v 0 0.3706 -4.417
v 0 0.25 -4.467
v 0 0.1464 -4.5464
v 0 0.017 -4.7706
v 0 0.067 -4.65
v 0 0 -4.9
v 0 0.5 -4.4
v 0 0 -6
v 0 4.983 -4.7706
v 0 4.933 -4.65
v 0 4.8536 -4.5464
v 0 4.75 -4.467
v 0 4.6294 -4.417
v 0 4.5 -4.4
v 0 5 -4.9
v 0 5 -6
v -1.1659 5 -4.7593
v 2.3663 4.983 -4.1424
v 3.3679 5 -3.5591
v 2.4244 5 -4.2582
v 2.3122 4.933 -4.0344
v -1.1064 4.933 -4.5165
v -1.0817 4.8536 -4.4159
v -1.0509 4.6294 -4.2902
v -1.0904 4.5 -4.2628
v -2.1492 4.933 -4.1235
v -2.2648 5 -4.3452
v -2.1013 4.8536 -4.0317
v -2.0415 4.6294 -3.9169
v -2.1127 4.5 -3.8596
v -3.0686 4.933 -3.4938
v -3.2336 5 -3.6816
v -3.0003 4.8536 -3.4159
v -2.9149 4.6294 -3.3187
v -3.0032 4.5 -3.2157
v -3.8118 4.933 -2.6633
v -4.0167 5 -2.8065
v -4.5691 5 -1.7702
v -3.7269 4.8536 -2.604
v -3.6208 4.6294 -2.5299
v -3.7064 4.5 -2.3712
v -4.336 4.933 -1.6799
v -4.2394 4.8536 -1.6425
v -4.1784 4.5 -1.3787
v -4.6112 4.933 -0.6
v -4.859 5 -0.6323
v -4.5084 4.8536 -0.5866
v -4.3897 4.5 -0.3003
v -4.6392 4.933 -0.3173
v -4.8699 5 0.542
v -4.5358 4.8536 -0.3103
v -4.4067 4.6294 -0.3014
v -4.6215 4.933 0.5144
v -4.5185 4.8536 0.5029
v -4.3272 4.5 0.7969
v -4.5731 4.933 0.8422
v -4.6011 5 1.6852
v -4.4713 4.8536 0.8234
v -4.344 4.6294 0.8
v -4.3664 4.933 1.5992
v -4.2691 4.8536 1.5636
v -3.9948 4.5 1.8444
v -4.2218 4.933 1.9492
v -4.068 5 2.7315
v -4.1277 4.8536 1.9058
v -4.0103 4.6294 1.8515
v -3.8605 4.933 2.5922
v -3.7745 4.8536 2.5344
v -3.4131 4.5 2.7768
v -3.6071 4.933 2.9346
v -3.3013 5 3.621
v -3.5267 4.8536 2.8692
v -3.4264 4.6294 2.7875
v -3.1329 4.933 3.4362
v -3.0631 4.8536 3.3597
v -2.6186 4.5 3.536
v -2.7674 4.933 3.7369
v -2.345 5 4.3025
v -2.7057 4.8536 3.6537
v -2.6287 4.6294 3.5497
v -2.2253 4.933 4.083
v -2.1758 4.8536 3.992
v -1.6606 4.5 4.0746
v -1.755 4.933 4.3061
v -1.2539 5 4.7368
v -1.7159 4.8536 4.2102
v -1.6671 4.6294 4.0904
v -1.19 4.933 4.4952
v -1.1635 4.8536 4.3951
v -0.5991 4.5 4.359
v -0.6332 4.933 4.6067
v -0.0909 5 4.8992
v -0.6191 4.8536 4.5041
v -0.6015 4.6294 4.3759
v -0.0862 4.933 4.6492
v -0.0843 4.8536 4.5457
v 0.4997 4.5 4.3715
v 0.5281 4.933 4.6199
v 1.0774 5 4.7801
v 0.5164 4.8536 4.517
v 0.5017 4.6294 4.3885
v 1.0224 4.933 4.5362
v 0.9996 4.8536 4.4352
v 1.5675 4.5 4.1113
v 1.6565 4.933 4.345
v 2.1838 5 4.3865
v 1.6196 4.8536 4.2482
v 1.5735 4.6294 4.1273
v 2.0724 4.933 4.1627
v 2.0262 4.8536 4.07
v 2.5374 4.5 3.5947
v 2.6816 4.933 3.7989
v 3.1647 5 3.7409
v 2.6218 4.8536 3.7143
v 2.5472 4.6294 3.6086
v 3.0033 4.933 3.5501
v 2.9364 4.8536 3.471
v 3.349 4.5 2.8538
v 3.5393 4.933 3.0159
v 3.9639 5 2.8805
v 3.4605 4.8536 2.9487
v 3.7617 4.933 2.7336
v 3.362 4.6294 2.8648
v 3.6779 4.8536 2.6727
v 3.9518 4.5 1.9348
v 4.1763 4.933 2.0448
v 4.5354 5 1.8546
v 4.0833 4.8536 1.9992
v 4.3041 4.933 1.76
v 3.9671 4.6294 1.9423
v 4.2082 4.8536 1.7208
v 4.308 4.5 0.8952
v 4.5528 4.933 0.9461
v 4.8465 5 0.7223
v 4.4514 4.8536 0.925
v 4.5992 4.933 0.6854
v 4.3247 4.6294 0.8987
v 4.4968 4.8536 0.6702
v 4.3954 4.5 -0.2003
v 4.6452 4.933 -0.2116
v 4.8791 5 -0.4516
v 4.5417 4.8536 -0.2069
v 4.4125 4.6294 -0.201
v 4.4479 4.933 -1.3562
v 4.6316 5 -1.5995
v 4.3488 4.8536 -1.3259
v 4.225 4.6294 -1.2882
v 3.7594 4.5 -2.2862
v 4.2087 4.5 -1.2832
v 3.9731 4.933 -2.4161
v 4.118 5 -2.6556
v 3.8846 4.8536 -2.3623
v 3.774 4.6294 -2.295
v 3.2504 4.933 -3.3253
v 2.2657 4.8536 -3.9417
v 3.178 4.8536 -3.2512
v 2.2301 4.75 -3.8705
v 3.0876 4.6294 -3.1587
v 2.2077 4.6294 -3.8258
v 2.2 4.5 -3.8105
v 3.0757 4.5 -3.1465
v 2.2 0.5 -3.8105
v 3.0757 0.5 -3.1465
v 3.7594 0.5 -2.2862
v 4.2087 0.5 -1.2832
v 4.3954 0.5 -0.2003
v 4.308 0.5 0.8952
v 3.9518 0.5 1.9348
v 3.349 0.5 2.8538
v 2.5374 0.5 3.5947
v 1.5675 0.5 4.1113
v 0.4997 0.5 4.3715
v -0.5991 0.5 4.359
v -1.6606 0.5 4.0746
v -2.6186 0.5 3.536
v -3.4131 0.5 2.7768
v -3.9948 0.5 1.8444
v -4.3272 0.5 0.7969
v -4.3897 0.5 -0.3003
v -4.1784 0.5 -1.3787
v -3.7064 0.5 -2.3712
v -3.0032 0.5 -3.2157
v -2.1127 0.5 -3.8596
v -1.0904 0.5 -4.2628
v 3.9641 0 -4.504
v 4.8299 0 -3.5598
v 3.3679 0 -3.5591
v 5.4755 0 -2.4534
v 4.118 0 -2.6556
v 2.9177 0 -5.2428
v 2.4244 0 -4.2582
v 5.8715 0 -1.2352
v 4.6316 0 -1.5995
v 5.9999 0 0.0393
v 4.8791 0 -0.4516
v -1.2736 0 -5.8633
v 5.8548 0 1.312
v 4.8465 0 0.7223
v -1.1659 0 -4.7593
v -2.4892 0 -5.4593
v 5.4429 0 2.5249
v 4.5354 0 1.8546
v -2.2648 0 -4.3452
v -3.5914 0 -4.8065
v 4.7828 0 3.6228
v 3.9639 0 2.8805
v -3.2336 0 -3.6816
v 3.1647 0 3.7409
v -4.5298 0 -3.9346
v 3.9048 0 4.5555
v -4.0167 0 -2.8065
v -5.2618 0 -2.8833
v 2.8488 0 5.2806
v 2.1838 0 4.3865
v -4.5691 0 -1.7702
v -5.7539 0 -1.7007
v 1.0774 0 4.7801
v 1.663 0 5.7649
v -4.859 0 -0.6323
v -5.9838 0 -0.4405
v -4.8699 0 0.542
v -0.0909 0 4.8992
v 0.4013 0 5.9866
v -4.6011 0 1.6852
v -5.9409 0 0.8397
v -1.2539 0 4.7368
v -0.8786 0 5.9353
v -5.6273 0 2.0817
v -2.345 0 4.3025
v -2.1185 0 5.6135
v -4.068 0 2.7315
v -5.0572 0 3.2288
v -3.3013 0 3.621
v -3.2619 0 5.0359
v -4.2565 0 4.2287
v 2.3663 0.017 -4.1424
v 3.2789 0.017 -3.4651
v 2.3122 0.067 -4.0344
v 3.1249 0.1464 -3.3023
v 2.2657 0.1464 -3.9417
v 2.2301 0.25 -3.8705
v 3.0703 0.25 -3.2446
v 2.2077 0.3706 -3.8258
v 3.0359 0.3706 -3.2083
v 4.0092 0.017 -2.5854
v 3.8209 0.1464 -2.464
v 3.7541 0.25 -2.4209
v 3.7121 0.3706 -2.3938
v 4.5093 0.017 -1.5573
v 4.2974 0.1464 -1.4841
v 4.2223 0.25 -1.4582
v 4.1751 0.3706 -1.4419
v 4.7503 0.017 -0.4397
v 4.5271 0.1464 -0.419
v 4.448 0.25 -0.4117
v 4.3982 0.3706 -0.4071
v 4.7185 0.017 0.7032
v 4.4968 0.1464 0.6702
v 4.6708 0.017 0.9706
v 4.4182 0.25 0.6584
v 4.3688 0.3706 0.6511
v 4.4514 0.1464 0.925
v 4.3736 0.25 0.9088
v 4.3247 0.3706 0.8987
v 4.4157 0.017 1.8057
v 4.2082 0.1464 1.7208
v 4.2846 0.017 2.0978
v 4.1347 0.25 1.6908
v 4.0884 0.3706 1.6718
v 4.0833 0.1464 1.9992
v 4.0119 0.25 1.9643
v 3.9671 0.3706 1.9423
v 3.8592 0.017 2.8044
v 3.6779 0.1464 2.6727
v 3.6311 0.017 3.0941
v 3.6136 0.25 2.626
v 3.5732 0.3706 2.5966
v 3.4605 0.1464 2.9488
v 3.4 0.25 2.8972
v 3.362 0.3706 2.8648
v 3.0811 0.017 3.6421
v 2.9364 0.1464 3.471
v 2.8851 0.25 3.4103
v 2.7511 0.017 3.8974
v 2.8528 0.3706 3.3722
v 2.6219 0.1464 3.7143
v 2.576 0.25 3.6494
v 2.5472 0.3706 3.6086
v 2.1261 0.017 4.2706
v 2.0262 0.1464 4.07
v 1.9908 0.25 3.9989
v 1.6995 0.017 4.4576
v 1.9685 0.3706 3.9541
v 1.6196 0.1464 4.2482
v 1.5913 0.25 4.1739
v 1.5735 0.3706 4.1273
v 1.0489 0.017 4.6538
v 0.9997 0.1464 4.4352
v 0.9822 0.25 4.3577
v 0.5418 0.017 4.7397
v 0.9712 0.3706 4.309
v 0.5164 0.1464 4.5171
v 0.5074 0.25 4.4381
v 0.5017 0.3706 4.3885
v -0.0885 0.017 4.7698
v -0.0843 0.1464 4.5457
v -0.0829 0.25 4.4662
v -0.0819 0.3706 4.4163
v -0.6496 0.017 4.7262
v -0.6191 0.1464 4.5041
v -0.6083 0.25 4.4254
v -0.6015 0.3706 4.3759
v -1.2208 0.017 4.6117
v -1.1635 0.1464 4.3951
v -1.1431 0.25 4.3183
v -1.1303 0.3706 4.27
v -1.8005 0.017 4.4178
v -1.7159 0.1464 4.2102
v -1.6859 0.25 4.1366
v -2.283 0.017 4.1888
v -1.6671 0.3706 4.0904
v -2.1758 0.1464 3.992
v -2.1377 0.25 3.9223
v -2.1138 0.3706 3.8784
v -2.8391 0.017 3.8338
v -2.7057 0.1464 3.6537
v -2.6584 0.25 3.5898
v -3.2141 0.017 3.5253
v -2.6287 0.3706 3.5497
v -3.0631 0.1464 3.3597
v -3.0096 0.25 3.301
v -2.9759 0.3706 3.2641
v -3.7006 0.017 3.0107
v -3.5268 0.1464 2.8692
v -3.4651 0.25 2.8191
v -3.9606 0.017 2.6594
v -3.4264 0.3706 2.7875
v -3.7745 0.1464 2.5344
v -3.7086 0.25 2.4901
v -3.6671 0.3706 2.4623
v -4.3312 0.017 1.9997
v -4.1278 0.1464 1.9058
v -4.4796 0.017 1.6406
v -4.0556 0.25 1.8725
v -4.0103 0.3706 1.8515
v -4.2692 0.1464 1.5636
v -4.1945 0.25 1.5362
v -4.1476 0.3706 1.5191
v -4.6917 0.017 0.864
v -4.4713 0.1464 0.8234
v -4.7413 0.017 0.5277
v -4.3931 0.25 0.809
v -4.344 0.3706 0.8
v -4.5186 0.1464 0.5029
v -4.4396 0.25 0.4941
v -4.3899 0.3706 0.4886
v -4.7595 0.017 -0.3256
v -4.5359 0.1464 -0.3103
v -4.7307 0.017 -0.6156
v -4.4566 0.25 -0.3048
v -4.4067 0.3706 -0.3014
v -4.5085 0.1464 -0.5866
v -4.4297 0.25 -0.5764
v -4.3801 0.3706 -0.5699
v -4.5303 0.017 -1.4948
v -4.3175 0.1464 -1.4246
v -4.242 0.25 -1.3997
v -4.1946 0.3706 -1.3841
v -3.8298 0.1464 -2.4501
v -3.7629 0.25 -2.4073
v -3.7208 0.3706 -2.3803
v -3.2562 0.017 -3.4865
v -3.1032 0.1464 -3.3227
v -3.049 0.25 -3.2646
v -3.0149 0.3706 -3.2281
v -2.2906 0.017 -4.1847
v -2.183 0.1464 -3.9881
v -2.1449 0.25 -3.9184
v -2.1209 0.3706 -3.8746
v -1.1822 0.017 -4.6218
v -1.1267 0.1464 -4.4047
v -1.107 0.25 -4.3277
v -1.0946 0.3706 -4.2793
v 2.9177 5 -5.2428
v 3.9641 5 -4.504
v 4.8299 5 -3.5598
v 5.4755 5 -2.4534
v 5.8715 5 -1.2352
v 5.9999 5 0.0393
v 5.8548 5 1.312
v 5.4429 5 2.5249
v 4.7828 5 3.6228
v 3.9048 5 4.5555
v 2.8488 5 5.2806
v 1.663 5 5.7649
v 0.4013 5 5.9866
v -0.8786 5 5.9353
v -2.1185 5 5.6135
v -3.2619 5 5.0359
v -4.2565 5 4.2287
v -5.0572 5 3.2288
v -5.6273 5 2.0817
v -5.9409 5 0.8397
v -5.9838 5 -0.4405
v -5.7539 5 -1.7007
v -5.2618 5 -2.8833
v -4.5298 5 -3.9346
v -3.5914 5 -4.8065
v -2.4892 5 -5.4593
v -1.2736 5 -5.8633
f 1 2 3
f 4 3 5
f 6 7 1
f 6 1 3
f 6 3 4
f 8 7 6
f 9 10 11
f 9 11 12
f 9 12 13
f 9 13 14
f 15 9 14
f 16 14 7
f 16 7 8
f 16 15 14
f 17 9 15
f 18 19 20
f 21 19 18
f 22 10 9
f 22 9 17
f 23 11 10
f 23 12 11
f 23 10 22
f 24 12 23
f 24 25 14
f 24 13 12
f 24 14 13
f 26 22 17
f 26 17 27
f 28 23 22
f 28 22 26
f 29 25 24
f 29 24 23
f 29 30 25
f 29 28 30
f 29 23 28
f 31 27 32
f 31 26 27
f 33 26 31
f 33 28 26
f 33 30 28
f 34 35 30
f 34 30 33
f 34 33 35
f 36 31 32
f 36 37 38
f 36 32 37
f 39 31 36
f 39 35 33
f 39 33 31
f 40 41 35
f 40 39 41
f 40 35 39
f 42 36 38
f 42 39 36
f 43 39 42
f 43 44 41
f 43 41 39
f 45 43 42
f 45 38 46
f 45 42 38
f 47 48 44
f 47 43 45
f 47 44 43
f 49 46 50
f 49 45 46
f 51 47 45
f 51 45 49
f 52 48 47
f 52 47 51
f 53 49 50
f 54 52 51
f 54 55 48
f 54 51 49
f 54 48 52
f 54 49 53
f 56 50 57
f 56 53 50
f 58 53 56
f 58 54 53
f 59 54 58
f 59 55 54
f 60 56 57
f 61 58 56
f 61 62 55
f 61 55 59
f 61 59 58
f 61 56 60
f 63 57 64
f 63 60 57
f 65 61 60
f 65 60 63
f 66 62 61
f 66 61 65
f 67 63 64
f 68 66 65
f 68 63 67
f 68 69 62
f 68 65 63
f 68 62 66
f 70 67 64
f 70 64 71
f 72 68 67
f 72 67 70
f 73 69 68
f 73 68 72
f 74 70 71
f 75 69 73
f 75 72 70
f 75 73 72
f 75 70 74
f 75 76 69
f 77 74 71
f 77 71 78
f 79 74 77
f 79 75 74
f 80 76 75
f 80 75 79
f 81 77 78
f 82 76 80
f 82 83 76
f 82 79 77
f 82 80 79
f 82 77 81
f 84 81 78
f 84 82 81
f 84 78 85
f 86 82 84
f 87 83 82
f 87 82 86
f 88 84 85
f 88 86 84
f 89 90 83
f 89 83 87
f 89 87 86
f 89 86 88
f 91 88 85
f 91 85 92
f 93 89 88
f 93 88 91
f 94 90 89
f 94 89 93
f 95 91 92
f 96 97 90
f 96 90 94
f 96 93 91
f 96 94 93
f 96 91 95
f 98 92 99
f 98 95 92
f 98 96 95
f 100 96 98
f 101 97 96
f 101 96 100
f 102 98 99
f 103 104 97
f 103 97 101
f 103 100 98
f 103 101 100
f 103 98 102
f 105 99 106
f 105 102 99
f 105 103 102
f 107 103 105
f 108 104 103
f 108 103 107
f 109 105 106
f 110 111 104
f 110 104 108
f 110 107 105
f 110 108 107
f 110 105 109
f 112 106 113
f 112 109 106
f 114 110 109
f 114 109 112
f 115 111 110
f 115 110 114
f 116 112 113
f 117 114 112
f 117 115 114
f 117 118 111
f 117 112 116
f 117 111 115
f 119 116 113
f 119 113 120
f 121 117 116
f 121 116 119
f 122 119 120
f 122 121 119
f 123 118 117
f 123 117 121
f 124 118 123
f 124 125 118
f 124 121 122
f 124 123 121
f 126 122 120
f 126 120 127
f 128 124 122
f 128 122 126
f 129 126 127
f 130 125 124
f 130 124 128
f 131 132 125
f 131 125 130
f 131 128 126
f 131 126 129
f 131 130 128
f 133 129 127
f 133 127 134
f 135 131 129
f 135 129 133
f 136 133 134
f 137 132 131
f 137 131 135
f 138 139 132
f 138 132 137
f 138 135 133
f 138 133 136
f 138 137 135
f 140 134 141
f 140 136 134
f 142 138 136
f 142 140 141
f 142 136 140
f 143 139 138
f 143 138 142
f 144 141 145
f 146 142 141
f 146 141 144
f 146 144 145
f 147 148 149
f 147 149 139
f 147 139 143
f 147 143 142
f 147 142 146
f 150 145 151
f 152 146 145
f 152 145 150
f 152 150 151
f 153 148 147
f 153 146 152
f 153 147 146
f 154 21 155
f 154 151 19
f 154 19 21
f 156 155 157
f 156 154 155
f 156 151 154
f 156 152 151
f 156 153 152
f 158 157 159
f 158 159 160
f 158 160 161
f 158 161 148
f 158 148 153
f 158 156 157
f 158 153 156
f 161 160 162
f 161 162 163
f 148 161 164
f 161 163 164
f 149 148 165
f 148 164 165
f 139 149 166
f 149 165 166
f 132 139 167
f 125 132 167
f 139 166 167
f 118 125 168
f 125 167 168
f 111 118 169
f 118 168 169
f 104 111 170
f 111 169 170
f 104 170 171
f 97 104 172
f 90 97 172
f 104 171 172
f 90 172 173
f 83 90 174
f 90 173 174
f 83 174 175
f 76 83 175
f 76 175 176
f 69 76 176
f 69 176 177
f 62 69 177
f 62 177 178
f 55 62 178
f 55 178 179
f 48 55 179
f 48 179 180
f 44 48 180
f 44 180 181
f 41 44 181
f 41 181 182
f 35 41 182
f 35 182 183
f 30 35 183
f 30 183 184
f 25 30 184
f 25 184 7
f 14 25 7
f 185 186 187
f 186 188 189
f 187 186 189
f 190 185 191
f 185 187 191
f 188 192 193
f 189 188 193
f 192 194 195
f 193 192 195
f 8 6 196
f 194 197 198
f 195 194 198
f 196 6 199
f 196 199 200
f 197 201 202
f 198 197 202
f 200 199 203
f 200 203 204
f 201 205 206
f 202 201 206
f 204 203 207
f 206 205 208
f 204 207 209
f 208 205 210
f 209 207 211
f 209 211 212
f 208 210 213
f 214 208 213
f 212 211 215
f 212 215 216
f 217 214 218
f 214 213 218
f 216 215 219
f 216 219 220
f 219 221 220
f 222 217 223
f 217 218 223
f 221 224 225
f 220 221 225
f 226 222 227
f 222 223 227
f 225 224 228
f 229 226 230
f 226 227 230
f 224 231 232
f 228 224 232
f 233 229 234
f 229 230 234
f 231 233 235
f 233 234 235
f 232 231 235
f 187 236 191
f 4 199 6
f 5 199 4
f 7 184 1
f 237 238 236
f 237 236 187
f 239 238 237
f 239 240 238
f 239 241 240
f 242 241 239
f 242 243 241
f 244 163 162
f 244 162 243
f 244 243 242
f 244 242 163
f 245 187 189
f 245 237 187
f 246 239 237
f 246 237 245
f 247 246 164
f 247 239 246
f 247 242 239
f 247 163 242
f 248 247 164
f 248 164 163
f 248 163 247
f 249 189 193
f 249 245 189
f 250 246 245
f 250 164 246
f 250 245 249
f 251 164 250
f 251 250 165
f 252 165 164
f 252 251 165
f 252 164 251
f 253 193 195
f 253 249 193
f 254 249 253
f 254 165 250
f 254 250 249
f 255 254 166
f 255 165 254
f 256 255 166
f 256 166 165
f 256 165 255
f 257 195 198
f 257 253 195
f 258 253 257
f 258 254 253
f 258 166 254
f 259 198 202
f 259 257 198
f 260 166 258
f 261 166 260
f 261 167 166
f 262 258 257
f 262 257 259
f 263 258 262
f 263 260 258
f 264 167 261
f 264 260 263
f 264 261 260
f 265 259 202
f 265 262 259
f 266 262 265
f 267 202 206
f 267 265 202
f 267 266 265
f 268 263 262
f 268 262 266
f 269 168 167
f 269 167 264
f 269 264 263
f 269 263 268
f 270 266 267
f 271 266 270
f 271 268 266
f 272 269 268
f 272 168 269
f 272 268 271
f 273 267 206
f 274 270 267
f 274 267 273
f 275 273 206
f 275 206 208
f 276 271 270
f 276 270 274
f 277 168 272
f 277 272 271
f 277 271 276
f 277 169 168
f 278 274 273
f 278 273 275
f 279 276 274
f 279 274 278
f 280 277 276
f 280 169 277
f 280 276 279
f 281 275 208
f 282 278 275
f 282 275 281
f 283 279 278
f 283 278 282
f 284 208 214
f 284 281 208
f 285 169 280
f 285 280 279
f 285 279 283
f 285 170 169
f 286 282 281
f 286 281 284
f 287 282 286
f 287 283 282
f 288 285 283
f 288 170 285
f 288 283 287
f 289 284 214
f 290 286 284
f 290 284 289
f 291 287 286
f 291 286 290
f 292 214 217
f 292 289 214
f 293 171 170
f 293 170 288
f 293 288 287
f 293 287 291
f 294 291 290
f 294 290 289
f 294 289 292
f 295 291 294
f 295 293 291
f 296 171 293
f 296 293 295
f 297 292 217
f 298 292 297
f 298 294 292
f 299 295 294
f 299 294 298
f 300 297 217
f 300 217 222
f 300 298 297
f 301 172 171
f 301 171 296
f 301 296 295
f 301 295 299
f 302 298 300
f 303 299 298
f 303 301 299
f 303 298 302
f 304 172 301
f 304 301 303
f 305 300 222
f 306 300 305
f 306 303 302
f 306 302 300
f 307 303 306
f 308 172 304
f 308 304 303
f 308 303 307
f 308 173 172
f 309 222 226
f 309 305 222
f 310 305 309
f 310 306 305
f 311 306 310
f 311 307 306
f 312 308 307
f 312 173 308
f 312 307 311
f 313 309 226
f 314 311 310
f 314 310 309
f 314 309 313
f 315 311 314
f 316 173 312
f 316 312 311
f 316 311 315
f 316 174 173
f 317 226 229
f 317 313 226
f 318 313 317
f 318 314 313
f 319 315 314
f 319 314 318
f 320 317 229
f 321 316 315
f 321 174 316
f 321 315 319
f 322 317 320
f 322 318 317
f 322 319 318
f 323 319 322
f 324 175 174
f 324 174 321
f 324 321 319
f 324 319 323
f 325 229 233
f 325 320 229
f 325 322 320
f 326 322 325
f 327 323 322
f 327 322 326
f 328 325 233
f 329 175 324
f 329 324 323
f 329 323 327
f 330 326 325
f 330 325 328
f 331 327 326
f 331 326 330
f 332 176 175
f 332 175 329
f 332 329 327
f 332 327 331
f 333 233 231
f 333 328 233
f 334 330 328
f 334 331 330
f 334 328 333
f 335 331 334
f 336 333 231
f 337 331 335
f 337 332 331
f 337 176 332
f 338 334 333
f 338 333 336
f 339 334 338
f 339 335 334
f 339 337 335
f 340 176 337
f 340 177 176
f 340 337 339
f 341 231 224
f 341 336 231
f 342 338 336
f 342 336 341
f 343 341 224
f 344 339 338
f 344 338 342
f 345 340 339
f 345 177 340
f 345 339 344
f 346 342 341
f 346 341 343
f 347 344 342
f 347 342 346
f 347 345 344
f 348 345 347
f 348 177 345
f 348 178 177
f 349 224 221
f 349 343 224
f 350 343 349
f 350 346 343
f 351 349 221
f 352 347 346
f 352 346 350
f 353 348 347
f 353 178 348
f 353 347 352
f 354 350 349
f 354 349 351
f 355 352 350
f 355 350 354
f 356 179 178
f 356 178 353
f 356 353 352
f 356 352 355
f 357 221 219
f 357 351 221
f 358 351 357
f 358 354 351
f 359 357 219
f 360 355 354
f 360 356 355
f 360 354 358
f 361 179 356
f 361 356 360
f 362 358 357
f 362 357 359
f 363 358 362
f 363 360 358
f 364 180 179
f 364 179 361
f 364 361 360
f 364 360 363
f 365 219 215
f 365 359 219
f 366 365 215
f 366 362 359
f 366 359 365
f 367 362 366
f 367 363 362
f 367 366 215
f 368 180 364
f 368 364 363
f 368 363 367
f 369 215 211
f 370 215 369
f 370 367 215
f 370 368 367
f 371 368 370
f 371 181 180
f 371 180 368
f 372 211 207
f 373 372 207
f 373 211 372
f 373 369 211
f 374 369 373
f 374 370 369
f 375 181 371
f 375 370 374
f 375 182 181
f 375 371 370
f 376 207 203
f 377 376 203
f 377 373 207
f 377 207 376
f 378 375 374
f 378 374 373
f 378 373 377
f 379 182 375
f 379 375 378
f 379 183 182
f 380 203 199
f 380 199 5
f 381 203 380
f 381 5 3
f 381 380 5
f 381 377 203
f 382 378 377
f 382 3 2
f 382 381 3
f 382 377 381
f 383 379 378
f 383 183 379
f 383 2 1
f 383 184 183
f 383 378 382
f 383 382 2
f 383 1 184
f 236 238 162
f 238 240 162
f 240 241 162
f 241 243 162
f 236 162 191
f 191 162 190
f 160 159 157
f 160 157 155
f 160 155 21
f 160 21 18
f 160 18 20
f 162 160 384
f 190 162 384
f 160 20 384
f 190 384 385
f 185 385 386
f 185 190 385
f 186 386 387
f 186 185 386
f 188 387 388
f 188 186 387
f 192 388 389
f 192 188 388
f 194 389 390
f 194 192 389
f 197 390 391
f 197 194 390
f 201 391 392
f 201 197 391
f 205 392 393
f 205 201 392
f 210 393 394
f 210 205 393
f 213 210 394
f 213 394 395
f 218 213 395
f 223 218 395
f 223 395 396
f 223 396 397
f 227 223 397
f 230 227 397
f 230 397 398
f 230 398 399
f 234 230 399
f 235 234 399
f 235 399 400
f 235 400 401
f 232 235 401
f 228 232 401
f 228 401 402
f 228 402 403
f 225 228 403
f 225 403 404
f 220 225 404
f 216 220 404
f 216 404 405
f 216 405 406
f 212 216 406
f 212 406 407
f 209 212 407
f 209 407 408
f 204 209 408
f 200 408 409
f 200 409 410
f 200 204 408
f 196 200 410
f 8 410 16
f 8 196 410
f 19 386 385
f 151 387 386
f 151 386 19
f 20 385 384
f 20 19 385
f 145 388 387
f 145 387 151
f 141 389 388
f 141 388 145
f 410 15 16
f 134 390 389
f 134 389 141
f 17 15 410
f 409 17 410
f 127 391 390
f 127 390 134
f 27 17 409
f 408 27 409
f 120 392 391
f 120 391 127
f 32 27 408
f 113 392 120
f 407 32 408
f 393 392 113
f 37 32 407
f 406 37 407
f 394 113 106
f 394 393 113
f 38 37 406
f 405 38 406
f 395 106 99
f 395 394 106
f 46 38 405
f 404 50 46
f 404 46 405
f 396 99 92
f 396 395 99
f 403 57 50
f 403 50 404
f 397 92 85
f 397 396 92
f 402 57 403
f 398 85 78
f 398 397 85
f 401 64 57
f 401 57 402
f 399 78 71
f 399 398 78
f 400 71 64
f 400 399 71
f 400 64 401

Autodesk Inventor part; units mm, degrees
ref_plane "YZ Plane" through (0, 0, 0) normal (1, 0, 0) x (0, 1, 0)
ref_plane "XZ Plane" through (0, 0, 0) normal (0, 1, 0) x (-1, 0, 0)
ref_plane "XY Plane" through (0, 0, 0) normal (0, 0, 1) x (1, 0, 0)
sketch "Эскиз1" plane through (0, 0, 0) normal (0, 1, 0) x (-1, 0, 0)
  circle A0 centre (0, 0) radius 6
  circle A1 centre (0, 0) radius 4.4
  dimension "d6" = 12
  dimension "d7" = 8.8
extrude "Выдавливание1" add sketch "Эскиз1" along normal blind 5
sketch "Эскиз2" plane through (0, 5, 0) normal (0, 1, 0) x (1, 0, 0)
  circle A0 centre (0, 0) radius 4.4 projected
  arc A1 (2.2, 3.8105) -> (0, 4.4) centre (0, 0) ccw
  line L0 (0, 0) -> (2.2, 3.8105) construction
  line L1 (0, 0) -> (0, 4.4) construction
  line L2 (2.2, 3.8105) -> (3.5243, 6.4533)
  line L3 (0, 4.4) -> (0, 6.8034)
  circle A2 centre (0, 0) radius 6 projected
  point P0 (2.9177, 5.2428)
  point P1 (0, 6)
  dimension "d8" = 30
extrude "Выдавливание2" cut sketch "Эскиз2" against normal blind 5 contours A0 L3 A2 L2 picked at (0.3369, 5.4381)
fillet "Сопряжение2" radius 0.5 2 edges at (-1.1388, 0, 4.2501) (-1.1388, 5, 4.2501)
properties part number "fittingRingInstalled" material "Пластик ПАЭК"
